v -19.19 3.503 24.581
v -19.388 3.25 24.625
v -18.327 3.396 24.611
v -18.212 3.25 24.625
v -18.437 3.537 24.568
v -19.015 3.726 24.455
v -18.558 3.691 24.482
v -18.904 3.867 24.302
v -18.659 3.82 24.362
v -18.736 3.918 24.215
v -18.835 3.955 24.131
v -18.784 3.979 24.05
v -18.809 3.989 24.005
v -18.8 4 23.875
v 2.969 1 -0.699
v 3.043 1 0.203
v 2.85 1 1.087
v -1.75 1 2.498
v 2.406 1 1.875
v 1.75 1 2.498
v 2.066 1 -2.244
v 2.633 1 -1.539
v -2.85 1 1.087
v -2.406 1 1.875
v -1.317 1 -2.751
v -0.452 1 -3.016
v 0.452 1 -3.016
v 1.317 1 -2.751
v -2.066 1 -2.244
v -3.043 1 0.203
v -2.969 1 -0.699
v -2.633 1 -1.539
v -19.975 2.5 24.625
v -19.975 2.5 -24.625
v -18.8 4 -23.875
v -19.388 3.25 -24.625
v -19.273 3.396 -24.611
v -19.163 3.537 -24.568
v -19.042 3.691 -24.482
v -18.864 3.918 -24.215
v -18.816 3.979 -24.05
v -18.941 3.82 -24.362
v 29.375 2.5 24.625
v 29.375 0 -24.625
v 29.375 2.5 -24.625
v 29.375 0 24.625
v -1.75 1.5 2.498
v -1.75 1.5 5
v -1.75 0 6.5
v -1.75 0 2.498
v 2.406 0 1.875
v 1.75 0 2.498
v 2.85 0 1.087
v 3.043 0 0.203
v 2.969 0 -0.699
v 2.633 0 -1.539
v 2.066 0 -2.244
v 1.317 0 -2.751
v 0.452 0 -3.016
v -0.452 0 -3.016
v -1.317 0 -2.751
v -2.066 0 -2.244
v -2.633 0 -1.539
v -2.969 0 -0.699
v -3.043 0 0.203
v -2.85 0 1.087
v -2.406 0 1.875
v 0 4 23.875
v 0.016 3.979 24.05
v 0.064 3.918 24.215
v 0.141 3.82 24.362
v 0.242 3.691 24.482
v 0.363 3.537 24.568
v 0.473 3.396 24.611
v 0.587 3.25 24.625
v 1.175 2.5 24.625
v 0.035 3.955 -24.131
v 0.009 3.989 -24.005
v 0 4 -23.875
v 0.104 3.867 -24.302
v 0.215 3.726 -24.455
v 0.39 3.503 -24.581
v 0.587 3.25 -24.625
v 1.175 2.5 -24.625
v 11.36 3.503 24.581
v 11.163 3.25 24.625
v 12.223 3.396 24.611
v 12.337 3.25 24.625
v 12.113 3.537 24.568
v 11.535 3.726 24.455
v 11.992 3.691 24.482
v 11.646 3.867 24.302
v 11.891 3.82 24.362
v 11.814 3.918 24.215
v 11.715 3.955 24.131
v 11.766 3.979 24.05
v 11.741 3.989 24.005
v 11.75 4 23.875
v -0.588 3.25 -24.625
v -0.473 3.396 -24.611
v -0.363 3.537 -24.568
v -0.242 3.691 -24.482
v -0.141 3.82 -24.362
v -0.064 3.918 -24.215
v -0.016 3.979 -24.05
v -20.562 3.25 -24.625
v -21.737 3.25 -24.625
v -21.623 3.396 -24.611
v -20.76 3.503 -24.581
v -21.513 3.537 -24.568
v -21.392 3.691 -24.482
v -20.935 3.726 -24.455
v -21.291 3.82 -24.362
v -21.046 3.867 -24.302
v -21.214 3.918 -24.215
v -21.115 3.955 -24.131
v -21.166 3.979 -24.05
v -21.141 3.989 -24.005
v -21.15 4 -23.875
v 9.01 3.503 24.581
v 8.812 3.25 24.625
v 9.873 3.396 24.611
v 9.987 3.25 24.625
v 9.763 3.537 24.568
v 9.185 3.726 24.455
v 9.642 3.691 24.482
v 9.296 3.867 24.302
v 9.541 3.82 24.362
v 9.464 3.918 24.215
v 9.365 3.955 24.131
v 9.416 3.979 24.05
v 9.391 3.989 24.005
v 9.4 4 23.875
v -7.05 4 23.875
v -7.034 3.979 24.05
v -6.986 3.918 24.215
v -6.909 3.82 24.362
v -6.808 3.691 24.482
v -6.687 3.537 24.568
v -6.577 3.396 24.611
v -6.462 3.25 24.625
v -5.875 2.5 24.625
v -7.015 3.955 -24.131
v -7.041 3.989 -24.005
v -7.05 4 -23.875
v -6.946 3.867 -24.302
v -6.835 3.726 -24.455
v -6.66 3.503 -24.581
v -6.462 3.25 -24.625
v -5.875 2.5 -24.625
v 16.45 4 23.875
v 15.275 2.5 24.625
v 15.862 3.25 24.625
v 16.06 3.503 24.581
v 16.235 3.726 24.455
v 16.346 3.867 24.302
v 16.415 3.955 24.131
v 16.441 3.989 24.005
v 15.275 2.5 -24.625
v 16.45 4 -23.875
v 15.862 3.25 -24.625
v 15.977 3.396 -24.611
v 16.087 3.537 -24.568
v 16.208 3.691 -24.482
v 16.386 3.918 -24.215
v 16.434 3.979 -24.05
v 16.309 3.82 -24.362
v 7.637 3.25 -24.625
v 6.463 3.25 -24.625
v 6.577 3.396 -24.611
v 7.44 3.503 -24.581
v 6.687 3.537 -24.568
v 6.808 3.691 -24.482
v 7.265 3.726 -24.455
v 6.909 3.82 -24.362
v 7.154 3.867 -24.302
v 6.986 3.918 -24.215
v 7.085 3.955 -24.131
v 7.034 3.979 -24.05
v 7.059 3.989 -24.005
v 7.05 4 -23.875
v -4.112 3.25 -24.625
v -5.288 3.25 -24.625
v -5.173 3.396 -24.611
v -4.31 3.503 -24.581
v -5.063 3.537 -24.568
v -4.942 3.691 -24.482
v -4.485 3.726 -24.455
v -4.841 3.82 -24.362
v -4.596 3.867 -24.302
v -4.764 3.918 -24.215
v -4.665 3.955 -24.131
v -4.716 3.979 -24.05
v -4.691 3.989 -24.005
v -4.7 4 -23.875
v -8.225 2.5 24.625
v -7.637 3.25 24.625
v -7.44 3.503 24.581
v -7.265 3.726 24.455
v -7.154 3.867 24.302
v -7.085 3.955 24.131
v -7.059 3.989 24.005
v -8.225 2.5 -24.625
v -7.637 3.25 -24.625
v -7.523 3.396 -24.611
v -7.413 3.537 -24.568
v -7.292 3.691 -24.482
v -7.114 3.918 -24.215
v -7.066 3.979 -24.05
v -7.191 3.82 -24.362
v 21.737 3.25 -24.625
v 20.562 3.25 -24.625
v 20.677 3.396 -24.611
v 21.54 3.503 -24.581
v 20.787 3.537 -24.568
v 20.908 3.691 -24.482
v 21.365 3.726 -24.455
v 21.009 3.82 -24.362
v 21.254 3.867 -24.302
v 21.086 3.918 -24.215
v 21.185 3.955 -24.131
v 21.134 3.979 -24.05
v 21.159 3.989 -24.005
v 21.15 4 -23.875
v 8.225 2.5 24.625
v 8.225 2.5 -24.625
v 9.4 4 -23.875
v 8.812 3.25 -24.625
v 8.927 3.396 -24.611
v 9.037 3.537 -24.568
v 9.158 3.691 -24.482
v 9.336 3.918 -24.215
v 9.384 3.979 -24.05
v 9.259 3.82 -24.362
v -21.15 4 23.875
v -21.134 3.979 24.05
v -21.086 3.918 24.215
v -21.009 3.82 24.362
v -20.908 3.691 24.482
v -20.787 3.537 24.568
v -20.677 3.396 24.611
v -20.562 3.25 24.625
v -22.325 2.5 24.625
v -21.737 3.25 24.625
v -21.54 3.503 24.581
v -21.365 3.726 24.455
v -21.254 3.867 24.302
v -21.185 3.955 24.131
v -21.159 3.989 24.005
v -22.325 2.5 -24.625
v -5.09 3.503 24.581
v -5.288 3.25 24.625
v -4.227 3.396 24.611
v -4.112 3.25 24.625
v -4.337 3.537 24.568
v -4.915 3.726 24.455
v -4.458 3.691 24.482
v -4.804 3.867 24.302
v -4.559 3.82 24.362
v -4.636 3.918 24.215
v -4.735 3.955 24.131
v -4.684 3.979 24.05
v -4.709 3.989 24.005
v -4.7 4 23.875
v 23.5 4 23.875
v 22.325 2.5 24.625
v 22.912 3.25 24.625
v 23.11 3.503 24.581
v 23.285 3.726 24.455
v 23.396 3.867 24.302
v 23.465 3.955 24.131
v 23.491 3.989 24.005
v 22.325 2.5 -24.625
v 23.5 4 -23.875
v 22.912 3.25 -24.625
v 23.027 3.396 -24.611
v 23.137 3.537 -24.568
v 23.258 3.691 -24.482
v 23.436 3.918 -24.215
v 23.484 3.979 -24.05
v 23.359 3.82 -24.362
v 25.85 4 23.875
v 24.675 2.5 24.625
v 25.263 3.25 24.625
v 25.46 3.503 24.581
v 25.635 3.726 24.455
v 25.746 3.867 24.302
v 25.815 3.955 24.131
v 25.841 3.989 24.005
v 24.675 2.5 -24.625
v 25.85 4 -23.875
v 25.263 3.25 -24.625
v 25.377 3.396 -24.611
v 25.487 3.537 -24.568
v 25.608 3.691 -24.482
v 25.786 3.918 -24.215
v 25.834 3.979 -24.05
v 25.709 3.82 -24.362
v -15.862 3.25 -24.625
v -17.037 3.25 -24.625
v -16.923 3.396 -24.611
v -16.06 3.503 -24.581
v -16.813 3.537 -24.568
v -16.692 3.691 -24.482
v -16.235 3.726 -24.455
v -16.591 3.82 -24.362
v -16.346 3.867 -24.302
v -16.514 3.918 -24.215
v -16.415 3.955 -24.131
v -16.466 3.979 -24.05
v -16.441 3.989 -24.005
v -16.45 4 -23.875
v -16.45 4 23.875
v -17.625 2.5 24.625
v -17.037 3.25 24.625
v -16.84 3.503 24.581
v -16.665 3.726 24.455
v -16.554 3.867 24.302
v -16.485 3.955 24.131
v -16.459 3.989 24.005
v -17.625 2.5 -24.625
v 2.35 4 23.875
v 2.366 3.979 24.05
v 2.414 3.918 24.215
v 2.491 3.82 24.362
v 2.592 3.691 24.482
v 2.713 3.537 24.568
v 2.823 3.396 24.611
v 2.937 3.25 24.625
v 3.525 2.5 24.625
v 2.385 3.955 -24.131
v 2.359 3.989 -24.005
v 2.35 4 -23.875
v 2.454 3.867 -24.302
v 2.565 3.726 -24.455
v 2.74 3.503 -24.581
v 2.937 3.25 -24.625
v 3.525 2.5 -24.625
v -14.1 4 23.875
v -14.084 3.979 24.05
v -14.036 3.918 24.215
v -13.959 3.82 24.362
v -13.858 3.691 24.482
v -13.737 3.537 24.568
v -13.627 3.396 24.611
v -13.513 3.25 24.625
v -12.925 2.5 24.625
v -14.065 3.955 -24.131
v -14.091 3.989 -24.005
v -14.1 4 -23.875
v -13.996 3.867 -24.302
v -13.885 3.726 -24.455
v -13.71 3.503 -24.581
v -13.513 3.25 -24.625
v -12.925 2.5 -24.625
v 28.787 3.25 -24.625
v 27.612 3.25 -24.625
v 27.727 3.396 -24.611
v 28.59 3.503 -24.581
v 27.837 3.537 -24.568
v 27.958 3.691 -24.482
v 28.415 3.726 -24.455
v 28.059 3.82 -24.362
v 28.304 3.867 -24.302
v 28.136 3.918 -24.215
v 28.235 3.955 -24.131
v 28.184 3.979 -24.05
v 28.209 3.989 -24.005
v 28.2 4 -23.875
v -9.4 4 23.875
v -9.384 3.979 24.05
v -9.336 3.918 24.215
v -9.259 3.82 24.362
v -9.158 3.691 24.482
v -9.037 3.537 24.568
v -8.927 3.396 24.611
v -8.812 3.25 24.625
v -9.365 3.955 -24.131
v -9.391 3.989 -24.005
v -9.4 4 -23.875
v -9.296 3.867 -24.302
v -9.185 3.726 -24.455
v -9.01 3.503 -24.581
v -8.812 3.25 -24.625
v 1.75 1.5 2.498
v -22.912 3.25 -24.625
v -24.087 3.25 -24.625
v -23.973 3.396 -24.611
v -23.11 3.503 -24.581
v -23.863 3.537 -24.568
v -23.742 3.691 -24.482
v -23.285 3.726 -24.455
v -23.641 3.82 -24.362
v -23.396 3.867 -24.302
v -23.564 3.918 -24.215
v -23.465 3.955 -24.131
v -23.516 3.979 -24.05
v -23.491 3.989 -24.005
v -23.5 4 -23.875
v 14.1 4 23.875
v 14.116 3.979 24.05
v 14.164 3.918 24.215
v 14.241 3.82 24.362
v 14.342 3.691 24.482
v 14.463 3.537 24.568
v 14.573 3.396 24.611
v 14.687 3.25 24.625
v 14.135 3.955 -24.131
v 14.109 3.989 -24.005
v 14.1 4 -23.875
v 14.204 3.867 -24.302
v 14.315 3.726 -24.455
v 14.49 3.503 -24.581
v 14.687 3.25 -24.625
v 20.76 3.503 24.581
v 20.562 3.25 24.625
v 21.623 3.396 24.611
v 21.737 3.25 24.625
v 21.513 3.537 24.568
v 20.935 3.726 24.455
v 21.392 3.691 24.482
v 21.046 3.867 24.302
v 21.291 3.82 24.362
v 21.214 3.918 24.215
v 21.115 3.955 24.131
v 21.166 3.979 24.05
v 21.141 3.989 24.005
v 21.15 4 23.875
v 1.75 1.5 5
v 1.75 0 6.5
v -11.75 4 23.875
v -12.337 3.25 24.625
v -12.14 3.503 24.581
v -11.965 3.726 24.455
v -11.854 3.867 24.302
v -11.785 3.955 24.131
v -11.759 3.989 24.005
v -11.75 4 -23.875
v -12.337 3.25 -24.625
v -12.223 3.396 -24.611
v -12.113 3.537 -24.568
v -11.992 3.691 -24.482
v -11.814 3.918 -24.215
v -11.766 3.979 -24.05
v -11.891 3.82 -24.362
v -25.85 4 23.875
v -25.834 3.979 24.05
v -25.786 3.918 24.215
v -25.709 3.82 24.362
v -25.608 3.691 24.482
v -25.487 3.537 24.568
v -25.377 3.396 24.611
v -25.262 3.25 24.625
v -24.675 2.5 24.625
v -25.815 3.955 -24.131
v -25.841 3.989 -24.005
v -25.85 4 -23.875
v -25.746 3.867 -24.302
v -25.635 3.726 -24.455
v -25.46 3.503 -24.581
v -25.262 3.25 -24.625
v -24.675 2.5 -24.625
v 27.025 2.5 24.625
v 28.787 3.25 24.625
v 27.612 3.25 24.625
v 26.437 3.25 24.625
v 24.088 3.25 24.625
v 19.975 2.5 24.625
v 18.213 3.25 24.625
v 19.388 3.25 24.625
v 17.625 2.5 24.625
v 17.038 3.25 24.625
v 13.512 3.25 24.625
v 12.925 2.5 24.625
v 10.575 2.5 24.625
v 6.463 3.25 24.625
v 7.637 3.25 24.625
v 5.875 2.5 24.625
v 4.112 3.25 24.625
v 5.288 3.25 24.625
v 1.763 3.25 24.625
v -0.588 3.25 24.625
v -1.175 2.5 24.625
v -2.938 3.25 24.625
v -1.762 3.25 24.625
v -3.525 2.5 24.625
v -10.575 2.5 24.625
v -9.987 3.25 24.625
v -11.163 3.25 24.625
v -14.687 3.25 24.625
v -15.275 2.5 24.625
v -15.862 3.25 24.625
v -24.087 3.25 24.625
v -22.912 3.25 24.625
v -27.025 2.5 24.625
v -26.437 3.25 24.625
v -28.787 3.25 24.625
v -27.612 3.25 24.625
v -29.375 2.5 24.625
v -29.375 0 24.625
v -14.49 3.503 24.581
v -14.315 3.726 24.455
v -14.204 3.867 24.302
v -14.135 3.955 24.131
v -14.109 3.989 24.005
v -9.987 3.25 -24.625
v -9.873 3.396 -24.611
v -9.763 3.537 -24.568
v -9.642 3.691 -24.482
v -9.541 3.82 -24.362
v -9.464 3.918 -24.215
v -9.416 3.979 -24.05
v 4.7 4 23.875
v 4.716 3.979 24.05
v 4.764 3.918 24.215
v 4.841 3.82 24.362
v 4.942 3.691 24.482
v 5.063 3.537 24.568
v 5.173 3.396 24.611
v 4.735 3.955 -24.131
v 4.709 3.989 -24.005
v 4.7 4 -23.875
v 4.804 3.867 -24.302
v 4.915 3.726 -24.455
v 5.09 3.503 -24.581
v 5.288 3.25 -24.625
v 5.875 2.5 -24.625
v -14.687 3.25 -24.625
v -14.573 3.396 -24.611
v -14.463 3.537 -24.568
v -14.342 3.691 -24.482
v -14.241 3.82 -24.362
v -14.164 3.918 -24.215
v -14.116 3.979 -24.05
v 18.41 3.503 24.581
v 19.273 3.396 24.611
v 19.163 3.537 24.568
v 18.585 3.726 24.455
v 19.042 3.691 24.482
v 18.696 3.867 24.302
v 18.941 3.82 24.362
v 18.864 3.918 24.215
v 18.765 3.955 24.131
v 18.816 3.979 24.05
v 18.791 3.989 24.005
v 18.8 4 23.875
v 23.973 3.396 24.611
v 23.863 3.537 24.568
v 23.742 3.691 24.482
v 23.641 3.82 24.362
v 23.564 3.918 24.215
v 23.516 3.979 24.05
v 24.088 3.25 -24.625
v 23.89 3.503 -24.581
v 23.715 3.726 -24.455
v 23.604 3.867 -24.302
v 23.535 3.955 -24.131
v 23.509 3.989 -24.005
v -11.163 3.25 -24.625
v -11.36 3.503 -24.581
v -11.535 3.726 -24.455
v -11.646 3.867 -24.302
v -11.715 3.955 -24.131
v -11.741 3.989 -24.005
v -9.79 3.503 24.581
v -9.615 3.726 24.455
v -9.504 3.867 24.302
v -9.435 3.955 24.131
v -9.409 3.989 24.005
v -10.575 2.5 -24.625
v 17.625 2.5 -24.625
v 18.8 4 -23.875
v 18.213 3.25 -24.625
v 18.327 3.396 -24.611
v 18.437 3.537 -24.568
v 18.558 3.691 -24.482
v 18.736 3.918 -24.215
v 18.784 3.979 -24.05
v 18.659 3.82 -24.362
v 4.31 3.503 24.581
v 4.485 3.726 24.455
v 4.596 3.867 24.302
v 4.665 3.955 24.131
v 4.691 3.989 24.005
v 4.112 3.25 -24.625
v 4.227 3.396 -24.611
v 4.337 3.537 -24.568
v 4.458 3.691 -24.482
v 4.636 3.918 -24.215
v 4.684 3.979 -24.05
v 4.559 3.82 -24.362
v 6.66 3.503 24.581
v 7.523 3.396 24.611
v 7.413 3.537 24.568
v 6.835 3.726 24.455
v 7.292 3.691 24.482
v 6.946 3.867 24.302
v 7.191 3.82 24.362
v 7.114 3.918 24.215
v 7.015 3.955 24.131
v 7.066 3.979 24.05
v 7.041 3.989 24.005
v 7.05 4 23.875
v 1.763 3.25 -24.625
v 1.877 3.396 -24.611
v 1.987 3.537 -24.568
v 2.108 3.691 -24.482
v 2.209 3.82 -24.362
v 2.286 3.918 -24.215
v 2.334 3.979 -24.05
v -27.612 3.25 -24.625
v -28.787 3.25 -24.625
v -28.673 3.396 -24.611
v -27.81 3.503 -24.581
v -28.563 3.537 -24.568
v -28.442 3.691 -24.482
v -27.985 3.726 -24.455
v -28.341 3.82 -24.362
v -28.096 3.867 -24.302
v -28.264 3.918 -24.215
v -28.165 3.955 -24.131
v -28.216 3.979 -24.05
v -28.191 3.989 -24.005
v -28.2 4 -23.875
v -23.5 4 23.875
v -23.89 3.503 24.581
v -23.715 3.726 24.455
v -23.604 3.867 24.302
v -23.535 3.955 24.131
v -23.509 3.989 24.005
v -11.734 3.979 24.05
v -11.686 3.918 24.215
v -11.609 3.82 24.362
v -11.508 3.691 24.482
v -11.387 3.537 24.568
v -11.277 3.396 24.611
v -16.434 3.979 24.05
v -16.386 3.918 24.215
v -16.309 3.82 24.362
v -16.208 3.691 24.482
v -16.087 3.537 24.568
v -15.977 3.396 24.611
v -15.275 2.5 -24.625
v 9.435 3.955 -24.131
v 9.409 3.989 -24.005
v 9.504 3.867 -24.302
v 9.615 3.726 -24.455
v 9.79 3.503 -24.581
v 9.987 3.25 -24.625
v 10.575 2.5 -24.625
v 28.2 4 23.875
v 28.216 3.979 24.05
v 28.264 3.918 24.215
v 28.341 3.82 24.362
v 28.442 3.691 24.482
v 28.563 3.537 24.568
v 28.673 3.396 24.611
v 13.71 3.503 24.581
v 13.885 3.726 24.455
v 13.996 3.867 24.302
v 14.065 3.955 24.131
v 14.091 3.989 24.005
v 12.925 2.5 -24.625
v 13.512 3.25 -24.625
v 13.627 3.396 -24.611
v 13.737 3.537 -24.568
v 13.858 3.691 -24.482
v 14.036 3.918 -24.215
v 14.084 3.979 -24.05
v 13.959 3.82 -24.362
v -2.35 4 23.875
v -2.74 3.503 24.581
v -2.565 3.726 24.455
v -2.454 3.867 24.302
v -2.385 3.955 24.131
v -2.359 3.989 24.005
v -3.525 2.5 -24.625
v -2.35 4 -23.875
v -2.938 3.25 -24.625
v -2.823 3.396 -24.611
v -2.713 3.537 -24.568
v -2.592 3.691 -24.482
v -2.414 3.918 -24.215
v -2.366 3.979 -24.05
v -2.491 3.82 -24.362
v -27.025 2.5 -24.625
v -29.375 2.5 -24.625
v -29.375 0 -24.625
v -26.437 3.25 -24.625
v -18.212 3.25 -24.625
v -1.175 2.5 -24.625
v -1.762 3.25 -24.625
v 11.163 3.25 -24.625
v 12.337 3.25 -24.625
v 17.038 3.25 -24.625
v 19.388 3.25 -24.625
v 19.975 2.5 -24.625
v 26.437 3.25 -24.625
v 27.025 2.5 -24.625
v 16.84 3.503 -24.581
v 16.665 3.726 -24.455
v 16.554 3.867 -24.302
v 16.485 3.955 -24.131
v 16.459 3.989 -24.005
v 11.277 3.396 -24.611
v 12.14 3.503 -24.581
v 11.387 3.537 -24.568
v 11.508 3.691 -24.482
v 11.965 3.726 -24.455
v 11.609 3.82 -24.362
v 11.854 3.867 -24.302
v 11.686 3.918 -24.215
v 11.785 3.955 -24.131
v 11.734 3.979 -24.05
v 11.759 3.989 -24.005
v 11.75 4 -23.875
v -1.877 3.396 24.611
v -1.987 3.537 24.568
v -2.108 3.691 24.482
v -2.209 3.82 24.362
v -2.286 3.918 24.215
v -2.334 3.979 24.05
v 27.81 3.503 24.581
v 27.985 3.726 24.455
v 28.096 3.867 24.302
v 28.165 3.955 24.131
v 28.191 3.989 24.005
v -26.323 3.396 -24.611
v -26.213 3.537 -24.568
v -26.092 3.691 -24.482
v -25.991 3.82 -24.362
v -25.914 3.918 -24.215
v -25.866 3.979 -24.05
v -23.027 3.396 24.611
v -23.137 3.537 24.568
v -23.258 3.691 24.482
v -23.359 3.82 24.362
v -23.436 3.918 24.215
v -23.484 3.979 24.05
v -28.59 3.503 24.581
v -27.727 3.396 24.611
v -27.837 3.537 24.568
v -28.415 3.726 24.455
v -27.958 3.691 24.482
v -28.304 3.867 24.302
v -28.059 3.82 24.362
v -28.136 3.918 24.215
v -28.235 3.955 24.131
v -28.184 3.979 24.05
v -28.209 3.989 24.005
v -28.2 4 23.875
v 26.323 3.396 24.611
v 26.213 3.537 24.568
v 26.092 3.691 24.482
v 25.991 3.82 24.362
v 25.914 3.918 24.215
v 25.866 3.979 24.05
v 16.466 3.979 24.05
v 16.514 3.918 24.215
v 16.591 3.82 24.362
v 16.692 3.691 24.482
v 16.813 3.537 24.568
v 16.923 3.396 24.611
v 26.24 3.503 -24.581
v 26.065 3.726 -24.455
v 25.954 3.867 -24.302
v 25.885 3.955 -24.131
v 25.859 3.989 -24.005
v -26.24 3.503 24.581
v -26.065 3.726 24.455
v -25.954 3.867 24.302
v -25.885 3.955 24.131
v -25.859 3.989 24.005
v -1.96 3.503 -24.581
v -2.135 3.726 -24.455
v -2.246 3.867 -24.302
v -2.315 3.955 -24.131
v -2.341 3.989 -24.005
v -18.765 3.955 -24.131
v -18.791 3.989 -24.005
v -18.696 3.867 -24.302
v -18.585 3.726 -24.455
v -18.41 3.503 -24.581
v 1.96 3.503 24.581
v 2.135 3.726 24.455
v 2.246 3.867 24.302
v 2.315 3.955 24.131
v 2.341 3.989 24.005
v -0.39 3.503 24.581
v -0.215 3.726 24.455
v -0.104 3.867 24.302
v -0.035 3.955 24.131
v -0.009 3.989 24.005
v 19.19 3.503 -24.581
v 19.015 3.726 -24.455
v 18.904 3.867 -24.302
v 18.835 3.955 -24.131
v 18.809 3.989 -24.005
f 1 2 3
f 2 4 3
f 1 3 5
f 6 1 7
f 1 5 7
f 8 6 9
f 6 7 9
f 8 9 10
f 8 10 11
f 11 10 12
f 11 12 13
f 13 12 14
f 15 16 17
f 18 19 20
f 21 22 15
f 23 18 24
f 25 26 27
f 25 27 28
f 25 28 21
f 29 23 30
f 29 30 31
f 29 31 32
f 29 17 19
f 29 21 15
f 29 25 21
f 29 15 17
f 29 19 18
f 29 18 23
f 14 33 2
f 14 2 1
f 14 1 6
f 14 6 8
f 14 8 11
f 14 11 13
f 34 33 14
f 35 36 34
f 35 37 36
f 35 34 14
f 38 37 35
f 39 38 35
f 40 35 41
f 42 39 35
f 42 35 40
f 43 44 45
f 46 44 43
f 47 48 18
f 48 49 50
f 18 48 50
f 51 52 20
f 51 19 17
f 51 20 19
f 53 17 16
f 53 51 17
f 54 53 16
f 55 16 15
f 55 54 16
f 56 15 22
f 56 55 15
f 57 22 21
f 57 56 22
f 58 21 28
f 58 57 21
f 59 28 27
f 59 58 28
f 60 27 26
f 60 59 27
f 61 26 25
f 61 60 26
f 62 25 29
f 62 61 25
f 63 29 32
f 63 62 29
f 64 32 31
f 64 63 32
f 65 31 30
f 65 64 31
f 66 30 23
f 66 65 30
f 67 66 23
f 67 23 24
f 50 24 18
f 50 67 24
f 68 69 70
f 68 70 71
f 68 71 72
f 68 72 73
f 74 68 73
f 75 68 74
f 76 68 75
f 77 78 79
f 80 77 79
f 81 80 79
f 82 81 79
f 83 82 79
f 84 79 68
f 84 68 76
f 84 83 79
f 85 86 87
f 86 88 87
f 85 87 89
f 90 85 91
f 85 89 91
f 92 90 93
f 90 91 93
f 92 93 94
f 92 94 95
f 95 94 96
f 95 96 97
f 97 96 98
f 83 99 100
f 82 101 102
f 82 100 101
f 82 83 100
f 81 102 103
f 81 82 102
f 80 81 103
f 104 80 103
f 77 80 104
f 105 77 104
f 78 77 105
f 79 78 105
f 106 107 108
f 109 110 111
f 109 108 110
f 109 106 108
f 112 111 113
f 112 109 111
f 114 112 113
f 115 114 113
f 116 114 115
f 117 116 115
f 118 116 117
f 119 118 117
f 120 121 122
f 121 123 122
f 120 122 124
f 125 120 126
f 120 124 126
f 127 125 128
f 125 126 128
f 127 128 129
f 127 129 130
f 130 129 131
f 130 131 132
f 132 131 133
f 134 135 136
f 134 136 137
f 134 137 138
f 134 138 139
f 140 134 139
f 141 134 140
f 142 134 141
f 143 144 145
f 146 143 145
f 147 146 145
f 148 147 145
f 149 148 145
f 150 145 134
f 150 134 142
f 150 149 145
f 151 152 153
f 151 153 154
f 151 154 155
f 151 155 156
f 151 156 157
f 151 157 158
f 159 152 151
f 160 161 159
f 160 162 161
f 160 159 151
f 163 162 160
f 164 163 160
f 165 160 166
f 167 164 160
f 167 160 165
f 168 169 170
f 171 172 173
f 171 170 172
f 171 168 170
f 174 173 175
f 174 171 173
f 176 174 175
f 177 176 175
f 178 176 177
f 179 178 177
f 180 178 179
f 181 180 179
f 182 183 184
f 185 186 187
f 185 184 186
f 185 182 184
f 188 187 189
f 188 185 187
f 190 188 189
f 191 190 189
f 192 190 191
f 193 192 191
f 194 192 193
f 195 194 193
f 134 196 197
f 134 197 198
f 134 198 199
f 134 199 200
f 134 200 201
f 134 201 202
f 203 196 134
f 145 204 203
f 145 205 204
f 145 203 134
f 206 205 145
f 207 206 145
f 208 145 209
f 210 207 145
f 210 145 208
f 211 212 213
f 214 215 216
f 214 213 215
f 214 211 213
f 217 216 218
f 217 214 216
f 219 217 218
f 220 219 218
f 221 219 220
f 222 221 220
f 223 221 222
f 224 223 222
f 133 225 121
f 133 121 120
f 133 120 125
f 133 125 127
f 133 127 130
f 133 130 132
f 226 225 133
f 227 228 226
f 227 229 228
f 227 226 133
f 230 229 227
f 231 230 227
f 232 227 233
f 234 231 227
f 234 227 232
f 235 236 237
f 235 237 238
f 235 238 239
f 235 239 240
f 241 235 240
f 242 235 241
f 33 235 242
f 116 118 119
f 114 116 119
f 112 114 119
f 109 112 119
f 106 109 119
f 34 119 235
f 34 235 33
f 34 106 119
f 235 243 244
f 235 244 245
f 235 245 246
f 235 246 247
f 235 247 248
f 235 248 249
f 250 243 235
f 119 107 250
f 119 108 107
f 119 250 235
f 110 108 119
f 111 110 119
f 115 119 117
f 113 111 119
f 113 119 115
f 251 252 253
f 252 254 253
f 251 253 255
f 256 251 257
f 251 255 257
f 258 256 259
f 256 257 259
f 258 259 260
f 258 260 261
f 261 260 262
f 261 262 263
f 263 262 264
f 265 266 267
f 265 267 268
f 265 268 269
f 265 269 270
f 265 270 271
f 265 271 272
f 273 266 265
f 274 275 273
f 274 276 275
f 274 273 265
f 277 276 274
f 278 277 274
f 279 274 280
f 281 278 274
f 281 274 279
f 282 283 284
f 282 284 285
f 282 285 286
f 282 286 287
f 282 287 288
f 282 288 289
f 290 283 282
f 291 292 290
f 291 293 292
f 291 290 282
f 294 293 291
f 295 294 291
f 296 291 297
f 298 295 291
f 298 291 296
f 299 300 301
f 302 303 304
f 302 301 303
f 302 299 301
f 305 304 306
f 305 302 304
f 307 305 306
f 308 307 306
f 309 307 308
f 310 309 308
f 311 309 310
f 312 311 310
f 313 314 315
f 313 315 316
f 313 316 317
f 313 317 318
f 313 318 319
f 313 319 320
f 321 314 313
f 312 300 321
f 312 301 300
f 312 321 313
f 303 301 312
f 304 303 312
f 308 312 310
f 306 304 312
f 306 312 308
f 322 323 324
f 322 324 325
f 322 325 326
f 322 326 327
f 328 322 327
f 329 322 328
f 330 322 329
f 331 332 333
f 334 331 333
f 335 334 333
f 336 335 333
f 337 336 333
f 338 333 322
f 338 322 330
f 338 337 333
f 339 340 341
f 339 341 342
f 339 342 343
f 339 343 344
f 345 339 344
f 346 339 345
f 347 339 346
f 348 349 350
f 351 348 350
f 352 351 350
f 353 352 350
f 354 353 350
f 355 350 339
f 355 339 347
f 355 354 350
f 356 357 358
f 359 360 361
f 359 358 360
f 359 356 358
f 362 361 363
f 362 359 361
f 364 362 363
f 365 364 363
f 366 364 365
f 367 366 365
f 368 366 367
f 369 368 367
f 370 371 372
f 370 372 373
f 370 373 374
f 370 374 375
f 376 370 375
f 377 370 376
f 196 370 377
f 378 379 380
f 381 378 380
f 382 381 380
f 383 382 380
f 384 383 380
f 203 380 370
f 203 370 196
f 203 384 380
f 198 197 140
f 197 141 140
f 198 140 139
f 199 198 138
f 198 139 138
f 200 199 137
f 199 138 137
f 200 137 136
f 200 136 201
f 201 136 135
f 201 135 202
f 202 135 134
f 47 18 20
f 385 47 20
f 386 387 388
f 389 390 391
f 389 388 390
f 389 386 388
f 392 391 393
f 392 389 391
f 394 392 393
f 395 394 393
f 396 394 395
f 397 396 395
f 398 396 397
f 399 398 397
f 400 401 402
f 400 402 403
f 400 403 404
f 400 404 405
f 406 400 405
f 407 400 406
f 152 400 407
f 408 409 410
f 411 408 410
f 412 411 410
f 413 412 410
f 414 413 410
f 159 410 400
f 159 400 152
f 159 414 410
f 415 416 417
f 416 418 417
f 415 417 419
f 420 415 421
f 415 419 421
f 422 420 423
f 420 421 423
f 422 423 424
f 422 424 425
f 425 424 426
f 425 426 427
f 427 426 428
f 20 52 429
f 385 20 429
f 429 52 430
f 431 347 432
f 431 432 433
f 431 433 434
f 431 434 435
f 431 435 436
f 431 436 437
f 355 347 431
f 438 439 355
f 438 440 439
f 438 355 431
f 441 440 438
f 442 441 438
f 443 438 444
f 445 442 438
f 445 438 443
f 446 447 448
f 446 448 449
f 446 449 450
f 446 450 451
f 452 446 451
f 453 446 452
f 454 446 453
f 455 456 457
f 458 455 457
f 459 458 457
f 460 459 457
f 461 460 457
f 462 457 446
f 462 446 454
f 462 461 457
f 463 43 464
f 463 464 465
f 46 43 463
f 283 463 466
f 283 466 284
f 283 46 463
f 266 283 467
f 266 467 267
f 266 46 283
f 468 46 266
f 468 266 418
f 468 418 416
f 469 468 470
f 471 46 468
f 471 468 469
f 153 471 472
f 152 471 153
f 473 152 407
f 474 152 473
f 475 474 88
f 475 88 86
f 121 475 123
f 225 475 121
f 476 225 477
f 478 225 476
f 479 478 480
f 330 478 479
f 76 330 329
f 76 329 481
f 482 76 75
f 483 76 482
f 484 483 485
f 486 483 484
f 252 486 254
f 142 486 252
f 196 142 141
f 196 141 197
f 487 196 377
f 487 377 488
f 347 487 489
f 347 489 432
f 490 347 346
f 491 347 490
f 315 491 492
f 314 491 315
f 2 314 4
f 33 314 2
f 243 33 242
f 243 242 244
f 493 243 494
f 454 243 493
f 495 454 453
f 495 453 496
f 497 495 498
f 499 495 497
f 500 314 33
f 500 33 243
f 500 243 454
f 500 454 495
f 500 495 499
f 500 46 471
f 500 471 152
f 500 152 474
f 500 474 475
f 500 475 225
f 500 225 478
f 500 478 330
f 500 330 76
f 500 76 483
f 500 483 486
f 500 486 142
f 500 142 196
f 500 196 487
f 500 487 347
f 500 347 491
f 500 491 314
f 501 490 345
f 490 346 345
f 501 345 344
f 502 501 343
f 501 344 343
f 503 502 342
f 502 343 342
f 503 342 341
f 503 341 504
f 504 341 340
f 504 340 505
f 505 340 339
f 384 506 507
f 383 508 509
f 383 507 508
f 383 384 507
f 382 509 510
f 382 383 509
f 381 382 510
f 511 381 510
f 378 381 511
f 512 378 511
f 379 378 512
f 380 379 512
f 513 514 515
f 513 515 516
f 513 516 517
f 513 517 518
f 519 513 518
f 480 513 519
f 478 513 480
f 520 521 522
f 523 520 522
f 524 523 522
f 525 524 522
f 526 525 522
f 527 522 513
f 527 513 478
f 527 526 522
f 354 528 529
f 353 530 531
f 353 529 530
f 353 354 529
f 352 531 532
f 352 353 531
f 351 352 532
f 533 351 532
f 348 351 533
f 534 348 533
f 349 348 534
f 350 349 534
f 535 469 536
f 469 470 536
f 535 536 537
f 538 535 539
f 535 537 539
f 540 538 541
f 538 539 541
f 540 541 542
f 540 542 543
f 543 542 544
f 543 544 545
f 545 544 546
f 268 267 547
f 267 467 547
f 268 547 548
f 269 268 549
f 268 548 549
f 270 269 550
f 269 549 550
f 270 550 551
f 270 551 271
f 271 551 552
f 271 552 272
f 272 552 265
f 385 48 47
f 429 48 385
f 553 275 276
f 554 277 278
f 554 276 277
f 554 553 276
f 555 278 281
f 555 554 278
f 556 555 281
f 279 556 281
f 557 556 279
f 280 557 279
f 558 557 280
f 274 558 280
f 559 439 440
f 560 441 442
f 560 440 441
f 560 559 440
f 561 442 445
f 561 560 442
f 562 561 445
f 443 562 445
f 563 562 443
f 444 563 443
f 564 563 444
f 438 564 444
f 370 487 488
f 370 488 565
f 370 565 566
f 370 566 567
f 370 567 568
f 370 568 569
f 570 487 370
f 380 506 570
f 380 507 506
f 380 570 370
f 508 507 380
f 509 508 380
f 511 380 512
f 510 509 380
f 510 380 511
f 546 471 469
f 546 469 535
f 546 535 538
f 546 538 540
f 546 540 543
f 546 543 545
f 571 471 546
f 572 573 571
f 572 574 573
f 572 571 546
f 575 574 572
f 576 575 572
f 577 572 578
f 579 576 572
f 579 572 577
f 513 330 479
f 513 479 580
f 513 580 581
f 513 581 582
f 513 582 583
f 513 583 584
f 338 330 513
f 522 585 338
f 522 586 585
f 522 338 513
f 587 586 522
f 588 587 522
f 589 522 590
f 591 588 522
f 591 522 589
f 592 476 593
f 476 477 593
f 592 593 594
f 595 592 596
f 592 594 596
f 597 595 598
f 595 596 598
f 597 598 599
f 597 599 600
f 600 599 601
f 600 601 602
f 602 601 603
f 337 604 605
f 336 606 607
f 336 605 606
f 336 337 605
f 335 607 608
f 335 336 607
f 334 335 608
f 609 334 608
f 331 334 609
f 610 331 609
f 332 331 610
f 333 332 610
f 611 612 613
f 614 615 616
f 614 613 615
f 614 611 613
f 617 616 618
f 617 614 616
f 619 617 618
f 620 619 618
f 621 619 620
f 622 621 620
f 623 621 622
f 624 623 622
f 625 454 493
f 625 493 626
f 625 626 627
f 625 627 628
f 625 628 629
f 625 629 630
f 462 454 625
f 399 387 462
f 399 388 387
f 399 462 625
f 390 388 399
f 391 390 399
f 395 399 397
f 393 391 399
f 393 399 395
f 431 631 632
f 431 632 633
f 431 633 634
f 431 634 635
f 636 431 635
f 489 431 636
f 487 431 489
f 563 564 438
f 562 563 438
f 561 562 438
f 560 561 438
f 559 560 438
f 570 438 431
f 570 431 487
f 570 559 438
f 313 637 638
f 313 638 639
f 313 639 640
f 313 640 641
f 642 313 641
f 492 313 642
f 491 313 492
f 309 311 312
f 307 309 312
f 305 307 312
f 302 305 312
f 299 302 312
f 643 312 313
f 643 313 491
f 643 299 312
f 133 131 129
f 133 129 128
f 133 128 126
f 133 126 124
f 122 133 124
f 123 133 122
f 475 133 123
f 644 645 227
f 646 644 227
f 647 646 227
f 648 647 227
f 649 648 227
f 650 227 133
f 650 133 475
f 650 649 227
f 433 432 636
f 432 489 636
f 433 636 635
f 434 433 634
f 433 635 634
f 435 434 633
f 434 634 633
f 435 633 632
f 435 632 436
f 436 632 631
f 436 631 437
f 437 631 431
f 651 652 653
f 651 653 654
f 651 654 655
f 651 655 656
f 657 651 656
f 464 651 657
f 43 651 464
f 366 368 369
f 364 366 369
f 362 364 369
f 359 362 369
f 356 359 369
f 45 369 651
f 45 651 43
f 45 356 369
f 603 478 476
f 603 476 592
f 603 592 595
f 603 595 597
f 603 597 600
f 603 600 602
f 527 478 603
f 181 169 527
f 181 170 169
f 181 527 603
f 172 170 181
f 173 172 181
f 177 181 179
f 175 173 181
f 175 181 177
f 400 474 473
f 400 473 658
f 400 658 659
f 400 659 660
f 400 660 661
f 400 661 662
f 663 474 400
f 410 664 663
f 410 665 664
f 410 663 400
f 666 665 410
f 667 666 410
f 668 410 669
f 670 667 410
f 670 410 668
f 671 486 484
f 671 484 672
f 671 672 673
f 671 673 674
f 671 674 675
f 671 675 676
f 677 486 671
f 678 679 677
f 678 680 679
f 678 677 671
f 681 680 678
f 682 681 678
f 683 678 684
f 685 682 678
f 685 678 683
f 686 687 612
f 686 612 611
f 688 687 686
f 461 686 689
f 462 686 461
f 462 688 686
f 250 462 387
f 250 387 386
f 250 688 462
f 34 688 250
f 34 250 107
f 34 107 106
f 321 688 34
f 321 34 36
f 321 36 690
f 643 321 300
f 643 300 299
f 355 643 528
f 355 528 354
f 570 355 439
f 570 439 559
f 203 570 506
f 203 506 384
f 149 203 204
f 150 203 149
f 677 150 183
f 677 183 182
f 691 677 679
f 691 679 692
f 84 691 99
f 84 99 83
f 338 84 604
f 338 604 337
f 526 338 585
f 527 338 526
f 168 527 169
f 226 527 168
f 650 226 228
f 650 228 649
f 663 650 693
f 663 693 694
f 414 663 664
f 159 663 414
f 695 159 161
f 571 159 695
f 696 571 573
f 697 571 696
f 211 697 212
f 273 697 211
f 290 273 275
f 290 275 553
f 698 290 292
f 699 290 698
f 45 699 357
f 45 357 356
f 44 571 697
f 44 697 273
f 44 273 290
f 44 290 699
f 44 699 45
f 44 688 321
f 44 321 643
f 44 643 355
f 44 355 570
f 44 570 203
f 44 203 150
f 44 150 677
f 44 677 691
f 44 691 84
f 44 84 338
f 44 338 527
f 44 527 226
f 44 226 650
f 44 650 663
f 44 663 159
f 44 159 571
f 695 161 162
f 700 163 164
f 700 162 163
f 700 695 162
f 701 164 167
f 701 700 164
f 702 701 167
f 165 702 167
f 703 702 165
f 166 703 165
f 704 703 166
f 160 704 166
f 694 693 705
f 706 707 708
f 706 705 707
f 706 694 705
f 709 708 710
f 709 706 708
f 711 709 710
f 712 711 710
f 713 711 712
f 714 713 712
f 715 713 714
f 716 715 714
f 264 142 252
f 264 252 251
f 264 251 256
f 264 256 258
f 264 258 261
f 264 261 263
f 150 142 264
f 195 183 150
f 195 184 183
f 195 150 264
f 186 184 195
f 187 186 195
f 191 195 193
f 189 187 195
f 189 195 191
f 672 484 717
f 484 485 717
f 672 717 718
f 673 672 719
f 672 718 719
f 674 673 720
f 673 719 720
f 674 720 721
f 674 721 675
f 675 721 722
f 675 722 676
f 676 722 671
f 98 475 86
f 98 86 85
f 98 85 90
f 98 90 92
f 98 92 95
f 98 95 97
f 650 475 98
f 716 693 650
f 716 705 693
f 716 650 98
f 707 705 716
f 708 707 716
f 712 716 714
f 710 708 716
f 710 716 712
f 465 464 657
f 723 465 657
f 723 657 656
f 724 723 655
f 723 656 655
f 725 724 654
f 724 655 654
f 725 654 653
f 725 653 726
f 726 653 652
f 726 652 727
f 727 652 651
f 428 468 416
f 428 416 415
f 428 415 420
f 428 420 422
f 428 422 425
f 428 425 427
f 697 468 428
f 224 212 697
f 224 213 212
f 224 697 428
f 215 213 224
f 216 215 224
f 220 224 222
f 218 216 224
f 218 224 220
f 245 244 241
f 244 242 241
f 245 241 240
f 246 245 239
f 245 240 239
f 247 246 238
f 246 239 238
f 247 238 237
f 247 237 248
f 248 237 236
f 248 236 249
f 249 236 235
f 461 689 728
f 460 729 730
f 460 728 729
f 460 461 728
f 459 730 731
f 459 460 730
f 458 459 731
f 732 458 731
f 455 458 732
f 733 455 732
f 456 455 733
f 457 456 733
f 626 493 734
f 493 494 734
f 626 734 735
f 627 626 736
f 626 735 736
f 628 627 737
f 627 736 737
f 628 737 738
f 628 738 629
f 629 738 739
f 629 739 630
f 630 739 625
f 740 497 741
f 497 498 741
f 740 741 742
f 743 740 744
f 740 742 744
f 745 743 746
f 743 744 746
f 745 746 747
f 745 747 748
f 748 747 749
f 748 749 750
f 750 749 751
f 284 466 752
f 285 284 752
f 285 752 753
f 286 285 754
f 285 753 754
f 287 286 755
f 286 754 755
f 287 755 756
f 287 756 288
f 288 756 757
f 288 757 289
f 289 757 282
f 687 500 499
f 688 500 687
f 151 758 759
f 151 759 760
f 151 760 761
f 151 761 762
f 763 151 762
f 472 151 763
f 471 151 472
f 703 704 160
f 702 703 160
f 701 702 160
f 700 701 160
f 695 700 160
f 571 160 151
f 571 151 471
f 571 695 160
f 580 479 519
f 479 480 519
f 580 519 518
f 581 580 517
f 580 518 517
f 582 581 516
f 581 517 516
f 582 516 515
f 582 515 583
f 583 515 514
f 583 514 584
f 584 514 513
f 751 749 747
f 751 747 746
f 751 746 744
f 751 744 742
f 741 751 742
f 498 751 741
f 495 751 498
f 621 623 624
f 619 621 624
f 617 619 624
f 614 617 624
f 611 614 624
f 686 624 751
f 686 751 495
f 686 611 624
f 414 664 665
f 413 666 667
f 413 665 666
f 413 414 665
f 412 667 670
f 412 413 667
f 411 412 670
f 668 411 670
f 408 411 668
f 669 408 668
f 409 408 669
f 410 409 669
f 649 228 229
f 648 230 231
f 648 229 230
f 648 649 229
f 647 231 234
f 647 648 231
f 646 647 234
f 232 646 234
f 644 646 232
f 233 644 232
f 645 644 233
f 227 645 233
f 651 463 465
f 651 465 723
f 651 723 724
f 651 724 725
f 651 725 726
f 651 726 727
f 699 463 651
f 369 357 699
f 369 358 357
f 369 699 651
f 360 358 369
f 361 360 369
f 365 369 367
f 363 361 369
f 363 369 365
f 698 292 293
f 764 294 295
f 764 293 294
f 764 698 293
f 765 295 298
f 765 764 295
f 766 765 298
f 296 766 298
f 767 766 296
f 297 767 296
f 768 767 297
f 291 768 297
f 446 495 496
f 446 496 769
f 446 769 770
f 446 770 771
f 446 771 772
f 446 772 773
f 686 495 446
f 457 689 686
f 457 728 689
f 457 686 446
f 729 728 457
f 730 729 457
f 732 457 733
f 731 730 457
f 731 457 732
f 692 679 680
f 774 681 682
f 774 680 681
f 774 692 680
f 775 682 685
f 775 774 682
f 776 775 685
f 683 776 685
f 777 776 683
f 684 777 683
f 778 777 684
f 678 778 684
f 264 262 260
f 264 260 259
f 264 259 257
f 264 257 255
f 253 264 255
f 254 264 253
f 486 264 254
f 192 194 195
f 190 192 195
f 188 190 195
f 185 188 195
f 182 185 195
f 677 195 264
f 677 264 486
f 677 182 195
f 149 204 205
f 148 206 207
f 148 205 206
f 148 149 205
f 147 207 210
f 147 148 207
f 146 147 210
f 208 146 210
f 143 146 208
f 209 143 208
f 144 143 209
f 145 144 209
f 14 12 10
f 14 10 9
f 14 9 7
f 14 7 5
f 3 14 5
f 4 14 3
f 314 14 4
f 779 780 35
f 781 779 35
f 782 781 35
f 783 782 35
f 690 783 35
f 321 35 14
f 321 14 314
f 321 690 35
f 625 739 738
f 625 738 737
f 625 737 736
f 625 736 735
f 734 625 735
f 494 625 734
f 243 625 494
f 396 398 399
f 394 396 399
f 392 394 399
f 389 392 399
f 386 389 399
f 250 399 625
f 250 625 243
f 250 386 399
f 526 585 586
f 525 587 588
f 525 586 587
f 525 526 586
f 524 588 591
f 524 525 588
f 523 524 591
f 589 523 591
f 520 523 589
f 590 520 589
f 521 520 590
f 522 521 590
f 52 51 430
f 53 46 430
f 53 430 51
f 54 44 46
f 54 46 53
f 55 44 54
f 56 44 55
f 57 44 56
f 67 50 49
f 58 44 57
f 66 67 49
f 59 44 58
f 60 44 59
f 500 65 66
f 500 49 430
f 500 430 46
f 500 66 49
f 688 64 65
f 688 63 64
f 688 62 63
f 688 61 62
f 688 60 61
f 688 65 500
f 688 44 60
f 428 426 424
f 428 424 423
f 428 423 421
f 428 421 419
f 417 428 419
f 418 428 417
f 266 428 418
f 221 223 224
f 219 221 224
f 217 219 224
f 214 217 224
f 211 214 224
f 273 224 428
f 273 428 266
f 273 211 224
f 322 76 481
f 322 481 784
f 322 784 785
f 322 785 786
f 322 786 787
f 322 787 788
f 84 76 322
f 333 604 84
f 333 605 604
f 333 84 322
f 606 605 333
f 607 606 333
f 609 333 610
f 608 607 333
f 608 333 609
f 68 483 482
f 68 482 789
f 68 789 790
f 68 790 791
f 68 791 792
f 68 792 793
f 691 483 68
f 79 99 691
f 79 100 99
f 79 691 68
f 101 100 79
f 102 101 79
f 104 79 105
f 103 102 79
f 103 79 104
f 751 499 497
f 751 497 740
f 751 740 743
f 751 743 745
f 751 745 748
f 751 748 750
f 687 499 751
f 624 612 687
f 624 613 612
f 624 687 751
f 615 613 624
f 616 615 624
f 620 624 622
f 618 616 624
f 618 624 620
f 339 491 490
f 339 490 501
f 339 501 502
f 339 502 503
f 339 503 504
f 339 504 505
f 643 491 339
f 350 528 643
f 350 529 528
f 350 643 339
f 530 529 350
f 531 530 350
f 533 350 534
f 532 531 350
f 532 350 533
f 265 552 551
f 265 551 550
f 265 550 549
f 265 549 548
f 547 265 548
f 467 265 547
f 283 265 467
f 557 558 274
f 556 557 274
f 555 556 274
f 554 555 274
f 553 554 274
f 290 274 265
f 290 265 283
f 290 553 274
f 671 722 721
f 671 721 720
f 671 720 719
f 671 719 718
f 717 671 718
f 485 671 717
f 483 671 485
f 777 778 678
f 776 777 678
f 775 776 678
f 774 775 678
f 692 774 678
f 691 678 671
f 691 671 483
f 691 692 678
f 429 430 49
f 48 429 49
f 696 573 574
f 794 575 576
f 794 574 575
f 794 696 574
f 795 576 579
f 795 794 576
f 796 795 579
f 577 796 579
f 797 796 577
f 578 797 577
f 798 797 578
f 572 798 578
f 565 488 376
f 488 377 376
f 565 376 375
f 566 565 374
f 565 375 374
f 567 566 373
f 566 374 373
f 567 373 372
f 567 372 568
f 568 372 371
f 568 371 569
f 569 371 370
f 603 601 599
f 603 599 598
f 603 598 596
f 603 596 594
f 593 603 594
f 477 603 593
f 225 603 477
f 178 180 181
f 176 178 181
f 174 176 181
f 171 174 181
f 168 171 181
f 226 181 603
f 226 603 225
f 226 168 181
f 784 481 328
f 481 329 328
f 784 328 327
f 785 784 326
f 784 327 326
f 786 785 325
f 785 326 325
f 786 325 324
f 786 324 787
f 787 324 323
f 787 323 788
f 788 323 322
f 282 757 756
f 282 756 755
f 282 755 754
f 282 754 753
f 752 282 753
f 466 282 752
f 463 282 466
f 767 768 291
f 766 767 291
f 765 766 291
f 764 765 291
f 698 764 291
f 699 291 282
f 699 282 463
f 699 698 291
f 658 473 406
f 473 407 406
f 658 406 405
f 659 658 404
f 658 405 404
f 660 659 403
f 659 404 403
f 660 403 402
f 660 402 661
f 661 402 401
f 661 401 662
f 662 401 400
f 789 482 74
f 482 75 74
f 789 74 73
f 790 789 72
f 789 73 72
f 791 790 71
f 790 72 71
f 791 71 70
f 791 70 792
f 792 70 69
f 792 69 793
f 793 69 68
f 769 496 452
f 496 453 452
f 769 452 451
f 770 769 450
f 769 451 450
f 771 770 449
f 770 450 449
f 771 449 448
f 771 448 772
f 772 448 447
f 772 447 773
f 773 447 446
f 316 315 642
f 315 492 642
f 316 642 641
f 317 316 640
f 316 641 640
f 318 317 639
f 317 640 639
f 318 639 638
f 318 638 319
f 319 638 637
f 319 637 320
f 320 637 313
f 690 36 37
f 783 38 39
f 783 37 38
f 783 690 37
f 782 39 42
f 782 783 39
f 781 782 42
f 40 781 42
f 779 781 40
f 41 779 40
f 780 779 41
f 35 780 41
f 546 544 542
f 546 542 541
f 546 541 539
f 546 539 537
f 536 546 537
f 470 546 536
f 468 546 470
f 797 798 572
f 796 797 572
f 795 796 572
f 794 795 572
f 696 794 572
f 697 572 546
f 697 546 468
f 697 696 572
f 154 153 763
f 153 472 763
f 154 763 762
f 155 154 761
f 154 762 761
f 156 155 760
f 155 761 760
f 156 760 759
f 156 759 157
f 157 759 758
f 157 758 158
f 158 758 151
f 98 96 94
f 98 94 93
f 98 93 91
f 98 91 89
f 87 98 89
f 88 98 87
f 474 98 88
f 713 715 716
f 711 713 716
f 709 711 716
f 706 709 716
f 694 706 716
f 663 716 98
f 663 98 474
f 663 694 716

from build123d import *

# Parameters (mm, degrees)
SKETCH1_R           = 3.05
BOSS_EXTRUDE1_DEPTH = 1.5
BOSS_EXTRUDE2_DEPTH = 49.25
CUT_EXTRUDE1_DEPTH  = 1
CUT_EXTRUDE3_DEPTH  = 64.82752638948185
SKETCH5_R           = 3.099999999999995
BOSS_EXTRUDE3_DEPTH = 0.5
CUT_EXTRUDE4_DEPTH  = 0.5
CHAMFER3_SIZE       = 1.5


with BuildPart() as part:
    # Sketch1 → Boss-Extrude1 (new body)
    with BuildSketch(Plane(origin=(0, 0, 0), x_dir=(1, 0, 0), z_dir=(0, 1, 0))):
        Polygon((-29.375, 24.624999999999996), (29.375, 24.624999999999996), (29.375000000000004, -24.625000000000004), (-29.374999999999993, -24.625000000000004), align=None)
        with Locations(Location((-3.47e-15, -3.47e-15, 0), (0, 0, 270))):
            Circle(SKETCH1_R, mode=Mode.SUBTRACT)
    extrude(amount=BOSS_EXTRUDE1_DEPTH)

    # Sketch2 → Boss-Extrude2 (add)
    with BuildSketch(Plane(origin=(0, 0, -24.624999999999996), x_dir=(-1, 0, 0), z_dir=(0, 0, -1))):
        Polygon((-29.375, 1.5), (29.375, 1.5), (29.375, 2.5), (28.199999999999996, 4), (27.025, 2.5), (25.849999999999998, 4), (24.675, 2.5), (23.499999999999996, 4), (22.325, 2.5), (21.149999999999995, 4), (19.974999999999998, 2.5), (18.799999999999997, 4), (17.625, 2.5), (16.45, 4), (15.275, 2.5), (14.099999999999998, 4), (12.924999999999999, 2.5), (11.749999999999998, 4), (10.575, 2.5), (9.399999999999999, 4), (8.225, 2.5), (7.049999999999999, 4), (5.874999999999999, 2.5), (4.699999999999999, 4), (3.525, 2.5), (2.3499999999999996, 4), (1.1749999999999996, 2.5), (0, 4), (-1.1749999999999996, 2.5), (-2.3499999999999996, 4), (-3.525, 2.5), (-4.699999999999999, 4), (-5.874999999999999, 2.5), (-7.049999999999999, 4), (-8.225, 2.5), (-9.399999999999999, 4), (-10.575, 2.5), (-11.749999999999998, 4), (-12.924999999999999, 2.5), (-14.099999999999998, 4), (-15.275, 2.5), (-16.45, 4), (-17.625, 2.5), (-18.799999999999997, 4), (-19.974999999999998, 2.5), (-21.149999999999995, 4), (-22.325, 2.5), (-23.499999999999996, 4), (-24.675, 2.5), (-25.849999999999998, 4), (-27.025, 2.5), (-28.199999999999996, 4), (-29.375, 2.5), align=None)
    extrude(amount=-BOSS_EXTRUDE2_DEPTH)

    # Sketch3 → Cut-Extrude1 (cut)
    with BuildSketch(Plane(origin=(0, 0, 0), x_dir=(-1, 0, 0), z_dir=(0, -1, 0))):
        with BuildLine():
            Line((-1.7499999999999998, -2.497999199359359), (-1.7499999999999993, -5))
            Line((-1.7499999999999993, -5), (1.7500000000000007, -5))
            Line((1.7500000000000007, -5), (1.7499999999999998, -2.4979991993593593))
            ThreePointArc((1.7499999999999998, -2.4979991993593593), (1.54e-15, 3.05), (-1.7499999999999998, -2.497999199359359))
        make_face()
    extrude(amount=-CUT_EXTRUDE1_DEPTH, mode=Mode.SUBTRACT)

    # Sketch4 → Cut-Extrude3 (cut, through all)
    with BuildSketch(Plane(origin=(29.375000000000004, 0, -4.14e-15), x_dir=(-1.4e-16, 0, -1), z_dir=(1, 0, -1.4e-16))):
        with BuildLine():
            Line((-23.875000000000007, 4), (-24.625000000000007, 4))
            Line((-24.625000000000007, 4), (-24.625000000000007, 3.2500000000000004))
            ThreePointArc((-24.625000000000007, 3.2500000000000004), (-24.40533008588992, 3.7803300858899114), (-23.875000000000007, 4))
        make_face()
    cut_extrude3 = extrude(amount=-CUT_EXTRUDE3_DEPTH, mode=Mode.SUBTRACT)

    # Mirror1: Cut-Extrude3 across plane
    add(cut_extrude3.mirror(Plane.XY), mode=Mode.SUBTRACT)

    # Sketch5 → Boss-Extrude3 (add)
    with BuildSketch(Plane.XZ.offset(-1.5)):
        Circle(SKETCH5_R)
    extrude(amount=BOSS_EXTRUDE3_DEPTH)

    # Sketch6 → Cut-Extrude4 (cut)
    with BuildSketch(Plane.XZ.offset(-1)):
        Polygon((1.7499999999999993, 5), (-1.7499999999999998, 5), (-1.7500000000000027, 2.497999199359363), (1.7499999999999993, 2.497999199359363), align=None)
    extrude(amount=-CUT_EXTRUDE4_DEPTH, mode=Mode.SUBTRACT)

    # Chamfer3
    chamfer3_edges = [part.edges().sort_by_distance(p)[0] for p in [
        (-6.7e-16, 0, 5),
    ]]
    chamfer(chamfer3_edges, length=CHAMFER3_SIZE - 0.0001)  # a hair under: the kernel refuses the full size


solid = part.part
